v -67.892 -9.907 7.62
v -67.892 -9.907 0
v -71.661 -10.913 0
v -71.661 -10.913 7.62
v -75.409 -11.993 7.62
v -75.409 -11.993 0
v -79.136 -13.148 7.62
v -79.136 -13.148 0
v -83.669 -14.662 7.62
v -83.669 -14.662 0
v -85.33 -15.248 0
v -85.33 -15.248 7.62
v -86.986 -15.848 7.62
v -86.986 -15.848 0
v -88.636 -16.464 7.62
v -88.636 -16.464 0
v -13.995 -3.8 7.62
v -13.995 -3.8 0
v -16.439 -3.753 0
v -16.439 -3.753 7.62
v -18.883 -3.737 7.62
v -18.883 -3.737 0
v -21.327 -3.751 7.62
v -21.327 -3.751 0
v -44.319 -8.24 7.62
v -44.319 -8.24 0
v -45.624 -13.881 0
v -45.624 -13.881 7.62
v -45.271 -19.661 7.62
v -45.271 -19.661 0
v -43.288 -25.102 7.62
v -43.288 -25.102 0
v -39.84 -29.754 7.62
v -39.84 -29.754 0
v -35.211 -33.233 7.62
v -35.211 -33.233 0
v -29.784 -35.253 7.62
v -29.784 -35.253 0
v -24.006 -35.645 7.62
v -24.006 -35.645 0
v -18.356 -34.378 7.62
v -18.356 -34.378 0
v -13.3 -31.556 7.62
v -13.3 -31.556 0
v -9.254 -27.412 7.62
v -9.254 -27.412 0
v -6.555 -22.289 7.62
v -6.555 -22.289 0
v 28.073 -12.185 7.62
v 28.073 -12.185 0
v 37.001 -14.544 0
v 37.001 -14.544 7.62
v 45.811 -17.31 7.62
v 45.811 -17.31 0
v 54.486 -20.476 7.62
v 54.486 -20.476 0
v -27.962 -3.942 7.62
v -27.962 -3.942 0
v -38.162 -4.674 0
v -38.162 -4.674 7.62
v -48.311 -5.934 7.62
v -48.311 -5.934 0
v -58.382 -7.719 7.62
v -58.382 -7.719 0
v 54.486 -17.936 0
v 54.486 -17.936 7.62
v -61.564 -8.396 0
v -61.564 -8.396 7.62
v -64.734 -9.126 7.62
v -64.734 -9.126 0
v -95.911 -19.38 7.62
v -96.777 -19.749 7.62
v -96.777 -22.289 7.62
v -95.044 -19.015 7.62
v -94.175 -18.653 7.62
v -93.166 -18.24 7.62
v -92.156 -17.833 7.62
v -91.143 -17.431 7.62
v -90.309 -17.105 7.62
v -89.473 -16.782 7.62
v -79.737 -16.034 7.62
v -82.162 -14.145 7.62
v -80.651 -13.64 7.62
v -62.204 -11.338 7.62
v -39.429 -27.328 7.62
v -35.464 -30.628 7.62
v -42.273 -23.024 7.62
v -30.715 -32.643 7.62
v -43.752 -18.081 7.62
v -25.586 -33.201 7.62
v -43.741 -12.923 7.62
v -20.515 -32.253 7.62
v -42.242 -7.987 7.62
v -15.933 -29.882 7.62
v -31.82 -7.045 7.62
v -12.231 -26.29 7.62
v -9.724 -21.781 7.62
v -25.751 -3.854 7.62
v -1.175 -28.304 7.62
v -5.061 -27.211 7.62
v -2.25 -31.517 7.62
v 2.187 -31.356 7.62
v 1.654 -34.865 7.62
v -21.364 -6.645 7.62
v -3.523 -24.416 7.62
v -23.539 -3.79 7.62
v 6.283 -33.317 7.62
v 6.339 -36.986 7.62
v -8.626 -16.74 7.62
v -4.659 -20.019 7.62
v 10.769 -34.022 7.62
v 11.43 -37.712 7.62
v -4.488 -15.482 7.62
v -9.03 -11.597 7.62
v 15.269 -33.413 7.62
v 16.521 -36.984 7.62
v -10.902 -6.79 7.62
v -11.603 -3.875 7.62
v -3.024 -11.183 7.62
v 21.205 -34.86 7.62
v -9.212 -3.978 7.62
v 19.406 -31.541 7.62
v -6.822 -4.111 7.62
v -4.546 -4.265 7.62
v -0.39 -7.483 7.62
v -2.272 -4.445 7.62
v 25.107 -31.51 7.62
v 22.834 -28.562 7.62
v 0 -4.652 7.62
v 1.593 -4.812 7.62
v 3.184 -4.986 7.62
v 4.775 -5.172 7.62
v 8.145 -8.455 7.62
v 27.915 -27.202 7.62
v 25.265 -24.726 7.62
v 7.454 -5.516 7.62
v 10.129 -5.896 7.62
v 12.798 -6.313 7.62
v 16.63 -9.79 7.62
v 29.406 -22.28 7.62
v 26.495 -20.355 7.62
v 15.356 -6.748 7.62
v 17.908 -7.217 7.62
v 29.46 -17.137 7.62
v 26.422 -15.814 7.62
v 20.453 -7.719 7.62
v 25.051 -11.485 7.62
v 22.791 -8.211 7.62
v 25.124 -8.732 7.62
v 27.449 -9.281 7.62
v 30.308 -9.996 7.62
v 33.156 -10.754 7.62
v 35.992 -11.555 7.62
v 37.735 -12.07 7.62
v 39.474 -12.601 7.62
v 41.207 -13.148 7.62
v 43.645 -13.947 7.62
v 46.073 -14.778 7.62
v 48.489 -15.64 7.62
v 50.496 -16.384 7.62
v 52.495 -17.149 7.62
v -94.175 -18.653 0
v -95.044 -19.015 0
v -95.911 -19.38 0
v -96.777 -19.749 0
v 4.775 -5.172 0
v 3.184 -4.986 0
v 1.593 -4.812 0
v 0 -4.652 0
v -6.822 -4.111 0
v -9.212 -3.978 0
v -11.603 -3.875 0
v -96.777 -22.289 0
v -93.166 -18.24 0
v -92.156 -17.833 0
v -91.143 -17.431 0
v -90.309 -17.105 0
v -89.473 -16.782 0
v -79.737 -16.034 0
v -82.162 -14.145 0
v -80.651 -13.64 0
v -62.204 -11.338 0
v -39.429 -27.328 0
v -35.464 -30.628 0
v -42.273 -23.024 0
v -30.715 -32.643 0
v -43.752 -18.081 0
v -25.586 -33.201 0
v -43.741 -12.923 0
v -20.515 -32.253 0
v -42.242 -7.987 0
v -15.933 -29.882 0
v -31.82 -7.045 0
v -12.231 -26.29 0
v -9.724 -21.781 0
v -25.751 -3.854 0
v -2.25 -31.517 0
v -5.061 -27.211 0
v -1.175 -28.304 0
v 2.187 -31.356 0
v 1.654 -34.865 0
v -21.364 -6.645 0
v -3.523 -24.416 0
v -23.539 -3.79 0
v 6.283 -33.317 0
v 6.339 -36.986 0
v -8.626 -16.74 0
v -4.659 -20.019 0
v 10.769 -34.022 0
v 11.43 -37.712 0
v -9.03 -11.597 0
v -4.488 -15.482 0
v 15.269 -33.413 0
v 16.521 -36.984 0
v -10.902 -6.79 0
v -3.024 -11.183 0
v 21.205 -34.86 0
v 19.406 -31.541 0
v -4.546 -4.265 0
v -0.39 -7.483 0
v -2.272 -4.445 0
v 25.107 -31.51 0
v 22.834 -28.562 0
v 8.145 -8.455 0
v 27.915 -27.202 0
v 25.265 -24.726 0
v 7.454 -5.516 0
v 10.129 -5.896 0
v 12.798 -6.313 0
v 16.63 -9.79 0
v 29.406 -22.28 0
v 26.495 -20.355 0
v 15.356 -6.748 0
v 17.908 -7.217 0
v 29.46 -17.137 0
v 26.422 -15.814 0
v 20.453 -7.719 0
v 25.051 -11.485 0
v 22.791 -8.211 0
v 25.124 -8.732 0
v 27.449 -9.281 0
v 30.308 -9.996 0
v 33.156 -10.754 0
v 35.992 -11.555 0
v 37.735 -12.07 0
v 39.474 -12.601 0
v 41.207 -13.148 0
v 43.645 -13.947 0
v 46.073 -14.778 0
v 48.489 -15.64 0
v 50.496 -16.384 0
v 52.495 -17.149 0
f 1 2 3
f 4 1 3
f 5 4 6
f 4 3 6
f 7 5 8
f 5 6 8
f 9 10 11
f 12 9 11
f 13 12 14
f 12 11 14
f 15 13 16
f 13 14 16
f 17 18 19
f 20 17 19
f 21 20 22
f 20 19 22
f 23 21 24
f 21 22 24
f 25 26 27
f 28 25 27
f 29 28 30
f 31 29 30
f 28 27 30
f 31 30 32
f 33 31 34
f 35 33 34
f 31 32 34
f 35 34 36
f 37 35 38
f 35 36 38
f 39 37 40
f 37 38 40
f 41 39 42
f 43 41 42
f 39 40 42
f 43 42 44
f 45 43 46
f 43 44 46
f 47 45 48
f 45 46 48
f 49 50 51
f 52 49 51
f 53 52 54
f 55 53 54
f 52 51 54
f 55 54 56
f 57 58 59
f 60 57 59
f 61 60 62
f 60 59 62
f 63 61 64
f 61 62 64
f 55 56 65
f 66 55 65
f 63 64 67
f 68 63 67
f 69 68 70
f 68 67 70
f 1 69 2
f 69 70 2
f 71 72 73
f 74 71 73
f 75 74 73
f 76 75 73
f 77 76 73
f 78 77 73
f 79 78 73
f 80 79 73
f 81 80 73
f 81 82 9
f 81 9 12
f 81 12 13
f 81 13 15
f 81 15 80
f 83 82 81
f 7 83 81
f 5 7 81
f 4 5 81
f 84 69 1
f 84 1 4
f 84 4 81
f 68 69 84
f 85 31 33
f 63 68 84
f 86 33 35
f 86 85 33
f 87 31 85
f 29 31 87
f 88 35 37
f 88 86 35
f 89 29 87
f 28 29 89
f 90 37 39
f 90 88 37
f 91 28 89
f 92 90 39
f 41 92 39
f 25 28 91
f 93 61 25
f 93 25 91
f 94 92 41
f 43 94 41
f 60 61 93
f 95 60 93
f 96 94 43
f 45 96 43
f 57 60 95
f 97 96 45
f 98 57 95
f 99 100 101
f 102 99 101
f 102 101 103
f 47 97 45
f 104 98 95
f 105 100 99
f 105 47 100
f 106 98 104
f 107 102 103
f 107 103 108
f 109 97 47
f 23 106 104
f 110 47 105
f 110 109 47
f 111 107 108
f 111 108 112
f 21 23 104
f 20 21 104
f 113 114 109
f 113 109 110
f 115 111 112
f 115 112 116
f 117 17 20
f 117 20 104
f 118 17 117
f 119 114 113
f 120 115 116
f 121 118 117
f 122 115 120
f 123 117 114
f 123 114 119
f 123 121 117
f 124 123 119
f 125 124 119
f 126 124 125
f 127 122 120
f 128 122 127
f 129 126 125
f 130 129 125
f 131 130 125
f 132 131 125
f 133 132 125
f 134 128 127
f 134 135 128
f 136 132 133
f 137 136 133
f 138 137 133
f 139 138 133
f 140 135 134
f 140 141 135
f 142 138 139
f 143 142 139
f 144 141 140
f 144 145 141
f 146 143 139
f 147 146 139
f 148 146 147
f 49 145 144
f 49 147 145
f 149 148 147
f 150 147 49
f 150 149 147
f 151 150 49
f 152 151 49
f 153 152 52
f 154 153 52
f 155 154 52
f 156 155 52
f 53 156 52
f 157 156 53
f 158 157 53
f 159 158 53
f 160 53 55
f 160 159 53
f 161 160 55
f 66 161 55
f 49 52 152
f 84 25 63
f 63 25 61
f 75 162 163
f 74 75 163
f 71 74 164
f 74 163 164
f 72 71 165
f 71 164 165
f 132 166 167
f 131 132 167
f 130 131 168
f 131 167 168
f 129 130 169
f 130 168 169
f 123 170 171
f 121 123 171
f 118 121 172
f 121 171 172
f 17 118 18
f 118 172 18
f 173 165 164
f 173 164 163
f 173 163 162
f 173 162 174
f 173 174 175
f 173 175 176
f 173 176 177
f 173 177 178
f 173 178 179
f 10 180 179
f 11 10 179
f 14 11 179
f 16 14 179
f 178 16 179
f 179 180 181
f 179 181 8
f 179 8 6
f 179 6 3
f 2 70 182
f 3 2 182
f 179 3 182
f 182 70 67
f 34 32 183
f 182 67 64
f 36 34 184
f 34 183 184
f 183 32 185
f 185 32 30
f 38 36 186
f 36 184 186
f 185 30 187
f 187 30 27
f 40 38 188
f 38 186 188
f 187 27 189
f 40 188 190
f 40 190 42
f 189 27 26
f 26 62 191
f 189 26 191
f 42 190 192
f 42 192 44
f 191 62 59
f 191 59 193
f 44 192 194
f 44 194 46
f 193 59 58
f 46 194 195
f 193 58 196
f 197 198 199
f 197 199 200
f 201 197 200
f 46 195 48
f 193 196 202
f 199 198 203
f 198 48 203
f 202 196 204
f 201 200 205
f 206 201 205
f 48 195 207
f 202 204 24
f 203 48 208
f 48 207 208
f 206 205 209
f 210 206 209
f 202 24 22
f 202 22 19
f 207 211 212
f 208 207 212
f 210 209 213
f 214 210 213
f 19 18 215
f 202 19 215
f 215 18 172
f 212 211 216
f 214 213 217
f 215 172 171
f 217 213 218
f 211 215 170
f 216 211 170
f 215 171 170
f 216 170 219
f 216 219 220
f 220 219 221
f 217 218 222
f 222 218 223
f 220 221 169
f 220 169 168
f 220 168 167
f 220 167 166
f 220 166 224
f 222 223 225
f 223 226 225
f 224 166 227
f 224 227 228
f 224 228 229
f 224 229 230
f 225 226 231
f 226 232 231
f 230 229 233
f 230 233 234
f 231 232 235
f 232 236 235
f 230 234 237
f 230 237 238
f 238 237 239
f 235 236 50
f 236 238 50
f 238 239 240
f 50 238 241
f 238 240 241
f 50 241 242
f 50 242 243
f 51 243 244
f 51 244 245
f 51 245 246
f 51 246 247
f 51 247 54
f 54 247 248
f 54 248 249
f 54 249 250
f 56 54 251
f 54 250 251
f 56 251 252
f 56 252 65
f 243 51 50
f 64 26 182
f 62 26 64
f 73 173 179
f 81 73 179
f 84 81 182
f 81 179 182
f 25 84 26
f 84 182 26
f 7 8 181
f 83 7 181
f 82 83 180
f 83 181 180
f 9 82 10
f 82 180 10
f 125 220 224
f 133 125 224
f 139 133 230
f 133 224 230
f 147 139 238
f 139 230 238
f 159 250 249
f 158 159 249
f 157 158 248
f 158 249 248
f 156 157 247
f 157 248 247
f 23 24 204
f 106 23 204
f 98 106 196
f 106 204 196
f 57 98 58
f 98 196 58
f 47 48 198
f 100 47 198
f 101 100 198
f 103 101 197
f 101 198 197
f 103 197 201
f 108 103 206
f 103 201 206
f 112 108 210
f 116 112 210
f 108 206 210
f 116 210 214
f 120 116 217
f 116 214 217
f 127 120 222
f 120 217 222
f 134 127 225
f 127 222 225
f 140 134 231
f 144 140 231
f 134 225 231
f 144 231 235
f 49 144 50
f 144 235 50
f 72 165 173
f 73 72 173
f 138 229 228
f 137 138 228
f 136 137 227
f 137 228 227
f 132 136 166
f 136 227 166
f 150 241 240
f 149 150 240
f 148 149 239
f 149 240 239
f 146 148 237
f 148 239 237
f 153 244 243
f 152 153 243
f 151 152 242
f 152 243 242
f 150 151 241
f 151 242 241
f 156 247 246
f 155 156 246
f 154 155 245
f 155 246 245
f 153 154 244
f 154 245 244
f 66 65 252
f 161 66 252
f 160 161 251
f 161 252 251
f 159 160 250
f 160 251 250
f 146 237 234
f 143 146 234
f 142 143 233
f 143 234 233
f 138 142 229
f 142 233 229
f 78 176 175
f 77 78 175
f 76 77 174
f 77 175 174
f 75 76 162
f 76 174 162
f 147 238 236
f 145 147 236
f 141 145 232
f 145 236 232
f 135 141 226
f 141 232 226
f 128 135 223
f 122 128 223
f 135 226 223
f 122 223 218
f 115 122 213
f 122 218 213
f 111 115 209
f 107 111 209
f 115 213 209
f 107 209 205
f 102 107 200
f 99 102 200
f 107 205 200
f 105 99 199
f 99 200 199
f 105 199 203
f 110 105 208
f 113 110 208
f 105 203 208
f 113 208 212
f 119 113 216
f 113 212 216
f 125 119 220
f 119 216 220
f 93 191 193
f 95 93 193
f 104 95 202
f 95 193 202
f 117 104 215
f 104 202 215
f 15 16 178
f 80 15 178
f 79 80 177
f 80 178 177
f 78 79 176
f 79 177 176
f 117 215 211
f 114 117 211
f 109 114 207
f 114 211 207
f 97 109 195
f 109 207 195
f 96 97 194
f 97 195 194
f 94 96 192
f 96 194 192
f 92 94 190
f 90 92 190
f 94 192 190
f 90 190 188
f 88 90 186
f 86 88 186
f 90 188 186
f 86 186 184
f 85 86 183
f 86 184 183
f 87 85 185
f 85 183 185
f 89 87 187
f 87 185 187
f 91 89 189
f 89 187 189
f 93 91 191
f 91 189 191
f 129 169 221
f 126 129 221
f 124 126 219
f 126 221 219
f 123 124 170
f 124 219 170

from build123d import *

# Parameters (mm, degrees)
F1_DEPTH = 7.62


# Not quite as in the source:
# - a feature names something its author has since deleted; it is built from what else it names


with BuildPart() as f1:
    # F0 (on Top) → F1 (new body)
    with BuildSketch(Plane.XY):
        with BuildLine():
            ThreePointArc((28.0726799719, -12.1853696085), (41.4217161306, -15.8764714027), (54.48557809, -20.4760919879))
            Line((54.48557809, -20.4760919879), (54.48557809, -17.9360919879))
            ThreePointArc((54.48557809, -17.9360919879), (51.4967288592, -16.763821011), (48.4891792987, -15.6403956202))
            ThreePointArc((48.4891792987, -15.6403956202), (44.8602983758, -14.3584600038), (41.2070755106, -13.1476345109))
            ThreePointArc((41.2070755106, -13.1476345109), (38.6048957608, -12.3330871208), (35.9916952796, -11.5546205858))
            ThreePointArc((35.9916952796, -11.5546205858), (31.733320464, -10.3696867585), (27.4494413676, -9.2805567694))
            ThreePointArc((27.4494413676, -9.2805567694), (23.9583783923, -8.4680969379), (20.4531163964, -7.7192645032))
            ThreePointArc((20.4531163964, -7.7192645032), (16.632517094, -6.9785468001), (12.7980359257, -6.3134183048))
            ThreePointArc((12.7980359257, -6.3134183048), (8.7921771864, -5.7014539178), (4.7745823593, -5.1719858311))
            ThreePointArc((4.7745823593, -5.1719858311), (2.3888765712, -4.897241097), (0, -4.6515878779))
            ThreePointArc((0, -4.6515878779), (-3.408711726, -4.3518848821), (-6.8221133026, -4.111412028))
            ThreePointArc((-6.8221133026, -4.111412028), (-10.4071482604, -3.922869598), (-13.9950228451, -3.7996630199))
            ThreePointArc((-13.9950228451, -3.7996630199), (-17.6605592517, -3.7413156735), (-21.3265467845, -3.7511630261))
            ThreePointArc((-21.3265467845, -3.7511630261), (-24.644831847, -3.8188928365), (-27.9615056934, -3.9424957507))
            ThreePointArc((-27.9615056934, -3.9424957507), (-43.2450696176, -5.2385218831), (-58.3815462887, -7.7192645032))
            ThreePointArc((-58.3815462887, -7.7192645032), (-63.1505292395, -8.7544721801), (-67.8924174044, -9.907446573))
            ThreePointArc((-67.8924174044, -9.907446573), (-73.5380139988, -11.4440807397), (-79.1355054029, -13.1476345109))
            ThreePointArc((-79.1355054029, -13.1476345109), (-81.4068857464, -13.8911431732), (-83.6690823894, -14.6621426181))
            ThreePointArc((-83.6690823894, -14.6621426181), (-86.1587803012, -15.5463139993), (-88.6364011403, -16.4637831816))
            ThreePointArc((-88.6364011403, -16.4637831816), (-89.8911745679, -16.9429103569), (-91.1426533968, -17.430578221))
            ThreePointArc((-91.1426533968, -17.430578221), (-92.6613427932, -18.0356268436), (-94.1749608987, -18.6532525791))
            ThreePointArc((-94.1749608987, -18.6532525791), (-95.4778611275, -19.1966804672), (-96.7768352111, -19.7494274307))
            Line((-96.7768352111, -19.7494274307), (-96.7768352111, -22.2894274307))
            ThreePointArc((-96.7768352111, -22.2894274307), (-71.0235394951, -13.4887335549), (-44.319003481, -8.239713722))
            ThreePointArc((-44.319003481, -8.239713722), (-43.2806848499, -8.1104188526), (-42.2417086499, -7.9865188972))
            ThreePointArc((-42.2417086499, -7.9865188972), (-26.5950201746, -6.7772498749), (-10.9016764341, -6.7896617958))
            ThreePointArc((-10.9016764341, -6.7896617958), (-6.4890042329, -7.0136625153), (-2.0823062052, -7.3343878974))
            ThreePointArc((-2.0823062052, -7.3343878974), (-1.2360355683, -7.4071155247), (-0.3900791081, -7.4834107816))
            ThreePointArc((-0.3900791081, -7.4834107816), (12.3943473899, -9.0773217505), (25.050742044, -11.4851812603))
            ThreePointArc((25.050742044, -11.4851812603), (26.5630587768, -11.8294586082), (28.0726799719, -12.1853696085))
        make_face()
        with BuildLine():
            ThreePointArc((-44.319003481, -8.239713722), (-32.5703828211, -34.4389737288), (-6.5546215011, -22.2894274307))
            ThreePointArc((-6.5546215011, -22.2894274307), (-6.0039890378, -14.307850149), (-2.0823062052, -7.3343878974))
            ThreePointArc((-2.0823062052, -7.3343878974), (-6.4890042329, -7.0136625153), (-10.9016764341, -6.7896617958))
            ThreePointArc((-10.9016764341, -6.7896617958), (-25.5859305121, -33.2005400837), (-42.2417086499, -7.9865188972))
            ThreePointArc((-42.2417086499, -7.9865188972), (-43.2806848499, -8.1104188526), (-44.319003481, -8.239713722))
        make_face()
        with BuildLine():
            ThreePointArc((-6.5546215011, -22.2894274307), (16.5208344464, -36.9835014795), (28.0726799719, -12.1853696085))
            ThreePointArc((28.0726799719, -12.1853696085), (26.5630587768, -11.8294586082), (25.050742044, -11.4851812603))
            ThreePointArc((25.050742044, -11.4851812603), (8.5004214133, -33.8325331942), (-0.3900791081, -7.4834107816))
            ThreePointArc((-0.3900791081, -7.4834107816), (-1.2360355683, -7.4071155247), (-2.0823062052, -7.3343878974))
            ThreePointArc((-2.0823062052, -7.3343878974), (-6.0039890378, -14.307850149), (-6.5546215011, -22.2894274307))
        make_face()
    extrude(amount=F1_DEPTH)


solid = f1.part
